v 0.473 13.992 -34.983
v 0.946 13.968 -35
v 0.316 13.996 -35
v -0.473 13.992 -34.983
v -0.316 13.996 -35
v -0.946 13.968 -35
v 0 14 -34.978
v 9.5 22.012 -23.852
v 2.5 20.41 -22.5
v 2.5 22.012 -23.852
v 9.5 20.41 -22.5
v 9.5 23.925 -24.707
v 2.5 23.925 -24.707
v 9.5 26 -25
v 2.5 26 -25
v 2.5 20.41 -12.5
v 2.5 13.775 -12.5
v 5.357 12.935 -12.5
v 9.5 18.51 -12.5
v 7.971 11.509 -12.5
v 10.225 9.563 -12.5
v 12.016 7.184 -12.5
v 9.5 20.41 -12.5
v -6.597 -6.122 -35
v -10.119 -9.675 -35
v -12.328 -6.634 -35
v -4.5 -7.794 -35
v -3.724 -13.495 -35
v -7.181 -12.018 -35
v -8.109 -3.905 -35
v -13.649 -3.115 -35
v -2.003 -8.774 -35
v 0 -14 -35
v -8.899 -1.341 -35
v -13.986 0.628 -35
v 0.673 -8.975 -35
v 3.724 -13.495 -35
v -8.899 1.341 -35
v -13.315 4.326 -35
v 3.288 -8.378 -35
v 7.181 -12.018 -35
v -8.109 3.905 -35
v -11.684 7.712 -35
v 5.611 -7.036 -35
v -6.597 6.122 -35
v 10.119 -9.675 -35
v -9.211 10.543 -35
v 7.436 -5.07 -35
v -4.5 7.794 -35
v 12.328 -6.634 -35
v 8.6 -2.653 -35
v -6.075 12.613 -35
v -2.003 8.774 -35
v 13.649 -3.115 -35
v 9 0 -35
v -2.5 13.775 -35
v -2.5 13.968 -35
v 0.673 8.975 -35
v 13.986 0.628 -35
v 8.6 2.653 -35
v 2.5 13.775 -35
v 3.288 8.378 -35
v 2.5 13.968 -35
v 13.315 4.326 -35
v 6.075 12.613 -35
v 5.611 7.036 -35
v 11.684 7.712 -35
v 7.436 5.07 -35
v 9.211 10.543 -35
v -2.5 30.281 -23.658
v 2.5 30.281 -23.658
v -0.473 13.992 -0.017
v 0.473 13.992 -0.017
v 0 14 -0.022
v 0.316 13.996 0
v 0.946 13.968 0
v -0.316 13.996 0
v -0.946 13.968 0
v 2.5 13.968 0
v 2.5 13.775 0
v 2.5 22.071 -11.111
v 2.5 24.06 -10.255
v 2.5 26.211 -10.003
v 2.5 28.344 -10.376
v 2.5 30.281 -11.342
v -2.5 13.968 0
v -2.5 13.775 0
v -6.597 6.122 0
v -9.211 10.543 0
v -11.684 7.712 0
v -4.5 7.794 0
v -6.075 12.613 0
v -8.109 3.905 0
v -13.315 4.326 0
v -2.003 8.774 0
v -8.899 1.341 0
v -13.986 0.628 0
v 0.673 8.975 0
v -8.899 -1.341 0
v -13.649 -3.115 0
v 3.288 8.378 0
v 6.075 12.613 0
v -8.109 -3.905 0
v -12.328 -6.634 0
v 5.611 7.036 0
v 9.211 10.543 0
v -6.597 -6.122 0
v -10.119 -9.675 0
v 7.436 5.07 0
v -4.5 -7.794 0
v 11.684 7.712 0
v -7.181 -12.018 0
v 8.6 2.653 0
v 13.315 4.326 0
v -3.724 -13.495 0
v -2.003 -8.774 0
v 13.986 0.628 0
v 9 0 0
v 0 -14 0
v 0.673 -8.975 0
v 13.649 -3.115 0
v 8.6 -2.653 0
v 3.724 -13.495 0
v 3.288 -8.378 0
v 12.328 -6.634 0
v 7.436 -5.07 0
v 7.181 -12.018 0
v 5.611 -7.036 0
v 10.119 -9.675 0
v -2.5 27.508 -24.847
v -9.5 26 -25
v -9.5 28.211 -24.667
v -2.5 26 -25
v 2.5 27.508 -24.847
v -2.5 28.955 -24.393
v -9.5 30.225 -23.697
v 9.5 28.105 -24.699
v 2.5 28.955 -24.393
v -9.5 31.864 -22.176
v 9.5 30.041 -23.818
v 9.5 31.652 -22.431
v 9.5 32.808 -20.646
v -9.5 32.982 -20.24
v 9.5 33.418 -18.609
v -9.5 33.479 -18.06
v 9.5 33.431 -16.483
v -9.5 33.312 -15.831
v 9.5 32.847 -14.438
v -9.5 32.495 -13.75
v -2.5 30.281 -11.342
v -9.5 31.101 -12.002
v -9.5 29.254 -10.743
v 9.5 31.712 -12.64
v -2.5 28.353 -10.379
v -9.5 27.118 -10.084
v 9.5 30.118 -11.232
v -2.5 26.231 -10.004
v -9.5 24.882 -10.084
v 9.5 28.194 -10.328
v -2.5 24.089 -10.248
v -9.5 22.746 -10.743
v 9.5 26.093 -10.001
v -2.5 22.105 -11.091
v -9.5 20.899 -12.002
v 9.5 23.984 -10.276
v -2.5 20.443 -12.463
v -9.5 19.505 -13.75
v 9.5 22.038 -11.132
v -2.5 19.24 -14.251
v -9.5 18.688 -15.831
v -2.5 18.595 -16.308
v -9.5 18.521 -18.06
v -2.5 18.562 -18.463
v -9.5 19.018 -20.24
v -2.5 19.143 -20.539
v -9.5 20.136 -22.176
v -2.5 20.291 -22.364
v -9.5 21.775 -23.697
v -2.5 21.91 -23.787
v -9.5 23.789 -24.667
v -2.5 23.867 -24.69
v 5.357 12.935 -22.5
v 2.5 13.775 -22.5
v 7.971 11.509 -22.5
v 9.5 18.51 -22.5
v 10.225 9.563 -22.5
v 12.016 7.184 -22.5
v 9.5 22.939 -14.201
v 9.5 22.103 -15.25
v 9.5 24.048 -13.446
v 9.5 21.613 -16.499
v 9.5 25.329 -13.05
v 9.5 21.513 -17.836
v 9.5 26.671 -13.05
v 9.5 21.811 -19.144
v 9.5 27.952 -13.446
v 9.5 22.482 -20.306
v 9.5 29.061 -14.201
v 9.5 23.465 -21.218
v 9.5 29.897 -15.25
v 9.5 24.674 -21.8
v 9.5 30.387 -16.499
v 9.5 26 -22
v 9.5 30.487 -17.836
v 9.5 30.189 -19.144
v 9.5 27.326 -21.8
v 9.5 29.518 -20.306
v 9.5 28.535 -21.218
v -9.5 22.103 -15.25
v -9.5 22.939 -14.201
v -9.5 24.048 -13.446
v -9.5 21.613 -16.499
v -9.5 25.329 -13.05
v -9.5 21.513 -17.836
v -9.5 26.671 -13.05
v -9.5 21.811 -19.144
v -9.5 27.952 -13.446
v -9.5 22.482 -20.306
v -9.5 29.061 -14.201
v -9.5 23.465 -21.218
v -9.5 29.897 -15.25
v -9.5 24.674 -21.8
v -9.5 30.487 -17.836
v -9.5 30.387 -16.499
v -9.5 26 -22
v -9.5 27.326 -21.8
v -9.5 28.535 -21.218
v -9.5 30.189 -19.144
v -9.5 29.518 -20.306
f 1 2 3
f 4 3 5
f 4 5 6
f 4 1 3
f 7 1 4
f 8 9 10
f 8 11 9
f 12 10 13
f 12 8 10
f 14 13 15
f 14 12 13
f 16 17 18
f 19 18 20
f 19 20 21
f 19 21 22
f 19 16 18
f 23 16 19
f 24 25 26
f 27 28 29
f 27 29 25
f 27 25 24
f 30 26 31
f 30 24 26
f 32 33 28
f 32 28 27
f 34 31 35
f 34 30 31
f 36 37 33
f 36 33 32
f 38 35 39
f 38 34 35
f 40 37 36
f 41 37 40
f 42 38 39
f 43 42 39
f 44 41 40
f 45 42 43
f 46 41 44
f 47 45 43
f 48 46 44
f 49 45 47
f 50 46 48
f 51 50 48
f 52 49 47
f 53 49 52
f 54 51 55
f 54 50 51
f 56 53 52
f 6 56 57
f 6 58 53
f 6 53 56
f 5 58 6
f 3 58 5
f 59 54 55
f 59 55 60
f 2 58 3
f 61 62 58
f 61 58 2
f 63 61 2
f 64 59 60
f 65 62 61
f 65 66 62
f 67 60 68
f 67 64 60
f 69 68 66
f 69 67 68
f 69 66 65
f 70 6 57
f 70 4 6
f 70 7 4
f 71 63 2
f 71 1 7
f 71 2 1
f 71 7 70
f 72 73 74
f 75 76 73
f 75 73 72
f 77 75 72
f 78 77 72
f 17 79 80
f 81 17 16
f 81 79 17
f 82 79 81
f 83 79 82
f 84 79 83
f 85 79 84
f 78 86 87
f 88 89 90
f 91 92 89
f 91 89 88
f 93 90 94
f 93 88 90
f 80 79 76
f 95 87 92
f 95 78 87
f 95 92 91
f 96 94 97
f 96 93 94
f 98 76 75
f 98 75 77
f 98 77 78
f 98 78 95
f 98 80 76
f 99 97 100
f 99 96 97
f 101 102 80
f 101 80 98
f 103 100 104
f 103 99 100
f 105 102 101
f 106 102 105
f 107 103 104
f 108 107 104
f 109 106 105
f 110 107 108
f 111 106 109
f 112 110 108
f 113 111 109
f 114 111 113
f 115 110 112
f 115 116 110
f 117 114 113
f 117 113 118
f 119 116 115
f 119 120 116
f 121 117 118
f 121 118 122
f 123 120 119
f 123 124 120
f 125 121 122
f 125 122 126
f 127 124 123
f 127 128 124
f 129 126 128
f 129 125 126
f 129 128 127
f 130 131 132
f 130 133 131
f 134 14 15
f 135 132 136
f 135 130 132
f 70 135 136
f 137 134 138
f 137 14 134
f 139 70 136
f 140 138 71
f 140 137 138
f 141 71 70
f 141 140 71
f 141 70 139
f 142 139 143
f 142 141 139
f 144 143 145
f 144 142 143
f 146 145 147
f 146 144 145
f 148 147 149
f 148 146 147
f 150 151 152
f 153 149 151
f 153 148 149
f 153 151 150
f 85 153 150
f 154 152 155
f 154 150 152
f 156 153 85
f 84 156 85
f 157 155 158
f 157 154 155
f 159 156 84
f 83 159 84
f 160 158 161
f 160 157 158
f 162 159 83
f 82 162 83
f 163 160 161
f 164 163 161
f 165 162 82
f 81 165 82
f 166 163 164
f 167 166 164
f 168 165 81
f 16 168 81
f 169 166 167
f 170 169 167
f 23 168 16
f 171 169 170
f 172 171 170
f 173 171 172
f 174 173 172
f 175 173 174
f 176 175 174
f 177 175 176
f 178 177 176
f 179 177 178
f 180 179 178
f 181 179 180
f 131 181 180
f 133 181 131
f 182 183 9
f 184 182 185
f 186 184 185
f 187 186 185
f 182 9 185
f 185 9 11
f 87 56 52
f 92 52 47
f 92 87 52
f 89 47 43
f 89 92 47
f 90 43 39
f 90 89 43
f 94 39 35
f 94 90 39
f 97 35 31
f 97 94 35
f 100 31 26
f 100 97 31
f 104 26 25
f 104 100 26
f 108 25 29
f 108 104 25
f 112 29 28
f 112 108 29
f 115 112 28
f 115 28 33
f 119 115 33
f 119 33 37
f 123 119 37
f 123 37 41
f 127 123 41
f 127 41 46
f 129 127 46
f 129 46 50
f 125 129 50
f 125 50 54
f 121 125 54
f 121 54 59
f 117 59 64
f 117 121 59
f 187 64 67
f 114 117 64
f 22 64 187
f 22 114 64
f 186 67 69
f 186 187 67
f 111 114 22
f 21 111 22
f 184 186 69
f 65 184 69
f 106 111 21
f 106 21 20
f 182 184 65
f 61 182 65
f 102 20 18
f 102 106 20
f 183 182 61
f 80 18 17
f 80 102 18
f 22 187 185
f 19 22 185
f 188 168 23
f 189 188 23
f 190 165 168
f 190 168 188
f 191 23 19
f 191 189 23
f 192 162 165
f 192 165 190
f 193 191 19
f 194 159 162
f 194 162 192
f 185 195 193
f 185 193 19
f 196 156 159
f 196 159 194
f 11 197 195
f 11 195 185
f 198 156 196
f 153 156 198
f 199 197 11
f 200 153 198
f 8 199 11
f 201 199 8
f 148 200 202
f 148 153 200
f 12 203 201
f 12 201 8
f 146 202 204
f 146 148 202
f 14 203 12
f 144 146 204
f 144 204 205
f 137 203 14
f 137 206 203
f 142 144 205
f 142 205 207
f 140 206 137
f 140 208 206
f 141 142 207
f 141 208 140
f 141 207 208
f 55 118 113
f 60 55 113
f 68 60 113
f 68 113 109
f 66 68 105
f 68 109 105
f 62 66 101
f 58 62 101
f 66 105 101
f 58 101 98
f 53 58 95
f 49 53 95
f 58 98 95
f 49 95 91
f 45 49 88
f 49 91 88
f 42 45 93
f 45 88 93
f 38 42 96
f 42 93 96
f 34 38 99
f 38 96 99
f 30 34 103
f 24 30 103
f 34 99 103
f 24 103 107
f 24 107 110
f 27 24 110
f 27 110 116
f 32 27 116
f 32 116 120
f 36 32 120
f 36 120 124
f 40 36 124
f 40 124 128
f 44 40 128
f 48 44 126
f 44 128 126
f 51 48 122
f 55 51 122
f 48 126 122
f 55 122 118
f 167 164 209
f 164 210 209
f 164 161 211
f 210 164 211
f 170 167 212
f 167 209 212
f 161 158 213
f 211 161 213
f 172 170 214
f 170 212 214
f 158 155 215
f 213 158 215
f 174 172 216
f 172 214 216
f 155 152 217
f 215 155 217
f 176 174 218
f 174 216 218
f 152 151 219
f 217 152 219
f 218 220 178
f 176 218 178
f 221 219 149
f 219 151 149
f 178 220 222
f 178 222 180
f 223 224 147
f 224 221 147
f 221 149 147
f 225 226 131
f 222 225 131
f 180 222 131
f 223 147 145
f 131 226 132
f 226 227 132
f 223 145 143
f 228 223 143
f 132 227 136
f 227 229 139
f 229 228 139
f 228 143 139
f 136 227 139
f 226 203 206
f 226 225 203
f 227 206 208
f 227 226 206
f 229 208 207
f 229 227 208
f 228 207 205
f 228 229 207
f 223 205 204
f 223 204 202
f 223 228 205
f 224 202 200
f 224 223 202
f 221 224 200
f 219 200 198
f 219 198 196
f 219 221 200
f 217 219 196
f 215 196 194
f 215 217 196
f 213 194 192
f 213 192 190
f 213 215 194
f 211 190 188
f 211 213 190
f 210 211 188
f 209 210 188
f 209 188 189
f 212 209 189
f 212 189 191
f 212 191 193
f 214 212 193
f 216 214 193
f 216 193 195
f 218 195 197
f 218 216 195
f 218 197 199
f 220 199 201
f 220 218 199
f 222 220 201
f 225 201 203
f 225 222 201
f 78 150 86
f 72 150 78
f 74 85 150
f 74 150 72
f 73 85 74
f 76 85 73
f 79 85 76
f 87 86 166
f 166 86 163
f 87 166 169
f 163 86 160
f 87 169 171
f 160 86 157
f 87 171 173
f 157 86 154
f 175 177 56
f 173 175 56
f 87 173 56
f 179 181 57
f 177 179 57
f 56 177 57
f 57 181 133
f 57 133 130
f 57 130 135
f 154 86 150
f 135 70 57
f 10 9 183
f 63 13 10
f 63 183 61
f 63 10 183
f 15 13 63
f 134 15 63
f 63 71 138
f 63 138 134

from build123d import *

# Parameters (mm, degrees)
SKETCH1_R           = 14
SKETCH1_R_2         = 9
BOSS_EXTRUDE1_DEPTH = 35
SKETCH2_R           = 7.5
SKETCH2_R_2         = 4.5
BOSS_EXTRUDE2_DEPTH = 9.5
BOSS_EXTRUDE4_DEPTH = 2.5
RIB6_START          = -5
RIB6_DEPTH          = 10


with BuildPart() as part:
    # Sketch1 → Boss-Extrude1 (new body)
    with BuildSketch(Plane.XY):
        Circle(SKETCH1_R)
        Circle(SKETCH1_R_2, mode=Mode.SUBTRACT)
    extrude(amount=-BOSS_EXTRUDE1_DEPTH)



with BuildPart() as body_2:
    # Sketch2 → Boss-Extrude2 (new, symmetric)
    with BuildSketch(Plane(origin=(0, 0, 0), x_dir=(0, 0, -1), z_dir=(1, 0, 0))):
        with Locations((17.5, 26)):
            Circle(SKETCH2_R)
        with Locations((17.5, 26)):
            Circle(SKETCH2_R_2, mode=Mode.SUBTRACT)
    extrude(amount=BOSS_EXTRUDE2_DEPTH, both=True)


with BuildPart() as part_1:
    add(part.part)

    add(body_2.part)  # Boss-Extrude4 merges body 2
    # Sketch4 → Boss-Extrude4 (add, symmetric)
    with BuildSketch(Plane(origin=(0, 0, 0), x_dir=(0, 0, -1), z_dir=(1, 0, 0))):
        with BuildLine():
            Line((11.342086503, 30.281366763), (0, 13.967981008))
            Line((0, 13.967981008), (0, 13.516905435))
            Line((0, 13.516905435), (35, 13.771632184))
            Line((35, 13.771632184), (35, 13.967981008))
            Line((35, 13.967981008), (23.657913497, 30.281366763))
            ThreePointArc((23.657913497, 30.281366763), (24.65661761, 28.243395726), (25, 26))
            ThreePointArc((25, 26), (15.256604274, 18.84338239), (11.342086503, 30.281366763))
        make_face()
    extrude(amount=BOSS_EXTRUDE4_DEPTH, both=True)

    # Rib6: read off the stored shape, not the designer's step
    # Rib6 outline → Rib6 (add)
    with BuildSketch(Plane.XY.offset(-17.5).offset(RIB6_START)):
        with BuildLine():
            Line((9.5, 20.409830056), (2.5, 20.409830056))
            Line((2.5, 20.409830056), (2.5, 13.774977314))
            ThreePointArc((2.5, 13.774977314), (7.971087724, 11.509203296), (12.016061116, 7.18430757))
            Line((12.016061116, 7.18430757), (9.5, 18.509693936))
            Line((9.5, 18.509693936), (9.5, 20.409830056))
        make_face()
    extrude(amount=RIB6_DEPTH)


solid = part_1.part
